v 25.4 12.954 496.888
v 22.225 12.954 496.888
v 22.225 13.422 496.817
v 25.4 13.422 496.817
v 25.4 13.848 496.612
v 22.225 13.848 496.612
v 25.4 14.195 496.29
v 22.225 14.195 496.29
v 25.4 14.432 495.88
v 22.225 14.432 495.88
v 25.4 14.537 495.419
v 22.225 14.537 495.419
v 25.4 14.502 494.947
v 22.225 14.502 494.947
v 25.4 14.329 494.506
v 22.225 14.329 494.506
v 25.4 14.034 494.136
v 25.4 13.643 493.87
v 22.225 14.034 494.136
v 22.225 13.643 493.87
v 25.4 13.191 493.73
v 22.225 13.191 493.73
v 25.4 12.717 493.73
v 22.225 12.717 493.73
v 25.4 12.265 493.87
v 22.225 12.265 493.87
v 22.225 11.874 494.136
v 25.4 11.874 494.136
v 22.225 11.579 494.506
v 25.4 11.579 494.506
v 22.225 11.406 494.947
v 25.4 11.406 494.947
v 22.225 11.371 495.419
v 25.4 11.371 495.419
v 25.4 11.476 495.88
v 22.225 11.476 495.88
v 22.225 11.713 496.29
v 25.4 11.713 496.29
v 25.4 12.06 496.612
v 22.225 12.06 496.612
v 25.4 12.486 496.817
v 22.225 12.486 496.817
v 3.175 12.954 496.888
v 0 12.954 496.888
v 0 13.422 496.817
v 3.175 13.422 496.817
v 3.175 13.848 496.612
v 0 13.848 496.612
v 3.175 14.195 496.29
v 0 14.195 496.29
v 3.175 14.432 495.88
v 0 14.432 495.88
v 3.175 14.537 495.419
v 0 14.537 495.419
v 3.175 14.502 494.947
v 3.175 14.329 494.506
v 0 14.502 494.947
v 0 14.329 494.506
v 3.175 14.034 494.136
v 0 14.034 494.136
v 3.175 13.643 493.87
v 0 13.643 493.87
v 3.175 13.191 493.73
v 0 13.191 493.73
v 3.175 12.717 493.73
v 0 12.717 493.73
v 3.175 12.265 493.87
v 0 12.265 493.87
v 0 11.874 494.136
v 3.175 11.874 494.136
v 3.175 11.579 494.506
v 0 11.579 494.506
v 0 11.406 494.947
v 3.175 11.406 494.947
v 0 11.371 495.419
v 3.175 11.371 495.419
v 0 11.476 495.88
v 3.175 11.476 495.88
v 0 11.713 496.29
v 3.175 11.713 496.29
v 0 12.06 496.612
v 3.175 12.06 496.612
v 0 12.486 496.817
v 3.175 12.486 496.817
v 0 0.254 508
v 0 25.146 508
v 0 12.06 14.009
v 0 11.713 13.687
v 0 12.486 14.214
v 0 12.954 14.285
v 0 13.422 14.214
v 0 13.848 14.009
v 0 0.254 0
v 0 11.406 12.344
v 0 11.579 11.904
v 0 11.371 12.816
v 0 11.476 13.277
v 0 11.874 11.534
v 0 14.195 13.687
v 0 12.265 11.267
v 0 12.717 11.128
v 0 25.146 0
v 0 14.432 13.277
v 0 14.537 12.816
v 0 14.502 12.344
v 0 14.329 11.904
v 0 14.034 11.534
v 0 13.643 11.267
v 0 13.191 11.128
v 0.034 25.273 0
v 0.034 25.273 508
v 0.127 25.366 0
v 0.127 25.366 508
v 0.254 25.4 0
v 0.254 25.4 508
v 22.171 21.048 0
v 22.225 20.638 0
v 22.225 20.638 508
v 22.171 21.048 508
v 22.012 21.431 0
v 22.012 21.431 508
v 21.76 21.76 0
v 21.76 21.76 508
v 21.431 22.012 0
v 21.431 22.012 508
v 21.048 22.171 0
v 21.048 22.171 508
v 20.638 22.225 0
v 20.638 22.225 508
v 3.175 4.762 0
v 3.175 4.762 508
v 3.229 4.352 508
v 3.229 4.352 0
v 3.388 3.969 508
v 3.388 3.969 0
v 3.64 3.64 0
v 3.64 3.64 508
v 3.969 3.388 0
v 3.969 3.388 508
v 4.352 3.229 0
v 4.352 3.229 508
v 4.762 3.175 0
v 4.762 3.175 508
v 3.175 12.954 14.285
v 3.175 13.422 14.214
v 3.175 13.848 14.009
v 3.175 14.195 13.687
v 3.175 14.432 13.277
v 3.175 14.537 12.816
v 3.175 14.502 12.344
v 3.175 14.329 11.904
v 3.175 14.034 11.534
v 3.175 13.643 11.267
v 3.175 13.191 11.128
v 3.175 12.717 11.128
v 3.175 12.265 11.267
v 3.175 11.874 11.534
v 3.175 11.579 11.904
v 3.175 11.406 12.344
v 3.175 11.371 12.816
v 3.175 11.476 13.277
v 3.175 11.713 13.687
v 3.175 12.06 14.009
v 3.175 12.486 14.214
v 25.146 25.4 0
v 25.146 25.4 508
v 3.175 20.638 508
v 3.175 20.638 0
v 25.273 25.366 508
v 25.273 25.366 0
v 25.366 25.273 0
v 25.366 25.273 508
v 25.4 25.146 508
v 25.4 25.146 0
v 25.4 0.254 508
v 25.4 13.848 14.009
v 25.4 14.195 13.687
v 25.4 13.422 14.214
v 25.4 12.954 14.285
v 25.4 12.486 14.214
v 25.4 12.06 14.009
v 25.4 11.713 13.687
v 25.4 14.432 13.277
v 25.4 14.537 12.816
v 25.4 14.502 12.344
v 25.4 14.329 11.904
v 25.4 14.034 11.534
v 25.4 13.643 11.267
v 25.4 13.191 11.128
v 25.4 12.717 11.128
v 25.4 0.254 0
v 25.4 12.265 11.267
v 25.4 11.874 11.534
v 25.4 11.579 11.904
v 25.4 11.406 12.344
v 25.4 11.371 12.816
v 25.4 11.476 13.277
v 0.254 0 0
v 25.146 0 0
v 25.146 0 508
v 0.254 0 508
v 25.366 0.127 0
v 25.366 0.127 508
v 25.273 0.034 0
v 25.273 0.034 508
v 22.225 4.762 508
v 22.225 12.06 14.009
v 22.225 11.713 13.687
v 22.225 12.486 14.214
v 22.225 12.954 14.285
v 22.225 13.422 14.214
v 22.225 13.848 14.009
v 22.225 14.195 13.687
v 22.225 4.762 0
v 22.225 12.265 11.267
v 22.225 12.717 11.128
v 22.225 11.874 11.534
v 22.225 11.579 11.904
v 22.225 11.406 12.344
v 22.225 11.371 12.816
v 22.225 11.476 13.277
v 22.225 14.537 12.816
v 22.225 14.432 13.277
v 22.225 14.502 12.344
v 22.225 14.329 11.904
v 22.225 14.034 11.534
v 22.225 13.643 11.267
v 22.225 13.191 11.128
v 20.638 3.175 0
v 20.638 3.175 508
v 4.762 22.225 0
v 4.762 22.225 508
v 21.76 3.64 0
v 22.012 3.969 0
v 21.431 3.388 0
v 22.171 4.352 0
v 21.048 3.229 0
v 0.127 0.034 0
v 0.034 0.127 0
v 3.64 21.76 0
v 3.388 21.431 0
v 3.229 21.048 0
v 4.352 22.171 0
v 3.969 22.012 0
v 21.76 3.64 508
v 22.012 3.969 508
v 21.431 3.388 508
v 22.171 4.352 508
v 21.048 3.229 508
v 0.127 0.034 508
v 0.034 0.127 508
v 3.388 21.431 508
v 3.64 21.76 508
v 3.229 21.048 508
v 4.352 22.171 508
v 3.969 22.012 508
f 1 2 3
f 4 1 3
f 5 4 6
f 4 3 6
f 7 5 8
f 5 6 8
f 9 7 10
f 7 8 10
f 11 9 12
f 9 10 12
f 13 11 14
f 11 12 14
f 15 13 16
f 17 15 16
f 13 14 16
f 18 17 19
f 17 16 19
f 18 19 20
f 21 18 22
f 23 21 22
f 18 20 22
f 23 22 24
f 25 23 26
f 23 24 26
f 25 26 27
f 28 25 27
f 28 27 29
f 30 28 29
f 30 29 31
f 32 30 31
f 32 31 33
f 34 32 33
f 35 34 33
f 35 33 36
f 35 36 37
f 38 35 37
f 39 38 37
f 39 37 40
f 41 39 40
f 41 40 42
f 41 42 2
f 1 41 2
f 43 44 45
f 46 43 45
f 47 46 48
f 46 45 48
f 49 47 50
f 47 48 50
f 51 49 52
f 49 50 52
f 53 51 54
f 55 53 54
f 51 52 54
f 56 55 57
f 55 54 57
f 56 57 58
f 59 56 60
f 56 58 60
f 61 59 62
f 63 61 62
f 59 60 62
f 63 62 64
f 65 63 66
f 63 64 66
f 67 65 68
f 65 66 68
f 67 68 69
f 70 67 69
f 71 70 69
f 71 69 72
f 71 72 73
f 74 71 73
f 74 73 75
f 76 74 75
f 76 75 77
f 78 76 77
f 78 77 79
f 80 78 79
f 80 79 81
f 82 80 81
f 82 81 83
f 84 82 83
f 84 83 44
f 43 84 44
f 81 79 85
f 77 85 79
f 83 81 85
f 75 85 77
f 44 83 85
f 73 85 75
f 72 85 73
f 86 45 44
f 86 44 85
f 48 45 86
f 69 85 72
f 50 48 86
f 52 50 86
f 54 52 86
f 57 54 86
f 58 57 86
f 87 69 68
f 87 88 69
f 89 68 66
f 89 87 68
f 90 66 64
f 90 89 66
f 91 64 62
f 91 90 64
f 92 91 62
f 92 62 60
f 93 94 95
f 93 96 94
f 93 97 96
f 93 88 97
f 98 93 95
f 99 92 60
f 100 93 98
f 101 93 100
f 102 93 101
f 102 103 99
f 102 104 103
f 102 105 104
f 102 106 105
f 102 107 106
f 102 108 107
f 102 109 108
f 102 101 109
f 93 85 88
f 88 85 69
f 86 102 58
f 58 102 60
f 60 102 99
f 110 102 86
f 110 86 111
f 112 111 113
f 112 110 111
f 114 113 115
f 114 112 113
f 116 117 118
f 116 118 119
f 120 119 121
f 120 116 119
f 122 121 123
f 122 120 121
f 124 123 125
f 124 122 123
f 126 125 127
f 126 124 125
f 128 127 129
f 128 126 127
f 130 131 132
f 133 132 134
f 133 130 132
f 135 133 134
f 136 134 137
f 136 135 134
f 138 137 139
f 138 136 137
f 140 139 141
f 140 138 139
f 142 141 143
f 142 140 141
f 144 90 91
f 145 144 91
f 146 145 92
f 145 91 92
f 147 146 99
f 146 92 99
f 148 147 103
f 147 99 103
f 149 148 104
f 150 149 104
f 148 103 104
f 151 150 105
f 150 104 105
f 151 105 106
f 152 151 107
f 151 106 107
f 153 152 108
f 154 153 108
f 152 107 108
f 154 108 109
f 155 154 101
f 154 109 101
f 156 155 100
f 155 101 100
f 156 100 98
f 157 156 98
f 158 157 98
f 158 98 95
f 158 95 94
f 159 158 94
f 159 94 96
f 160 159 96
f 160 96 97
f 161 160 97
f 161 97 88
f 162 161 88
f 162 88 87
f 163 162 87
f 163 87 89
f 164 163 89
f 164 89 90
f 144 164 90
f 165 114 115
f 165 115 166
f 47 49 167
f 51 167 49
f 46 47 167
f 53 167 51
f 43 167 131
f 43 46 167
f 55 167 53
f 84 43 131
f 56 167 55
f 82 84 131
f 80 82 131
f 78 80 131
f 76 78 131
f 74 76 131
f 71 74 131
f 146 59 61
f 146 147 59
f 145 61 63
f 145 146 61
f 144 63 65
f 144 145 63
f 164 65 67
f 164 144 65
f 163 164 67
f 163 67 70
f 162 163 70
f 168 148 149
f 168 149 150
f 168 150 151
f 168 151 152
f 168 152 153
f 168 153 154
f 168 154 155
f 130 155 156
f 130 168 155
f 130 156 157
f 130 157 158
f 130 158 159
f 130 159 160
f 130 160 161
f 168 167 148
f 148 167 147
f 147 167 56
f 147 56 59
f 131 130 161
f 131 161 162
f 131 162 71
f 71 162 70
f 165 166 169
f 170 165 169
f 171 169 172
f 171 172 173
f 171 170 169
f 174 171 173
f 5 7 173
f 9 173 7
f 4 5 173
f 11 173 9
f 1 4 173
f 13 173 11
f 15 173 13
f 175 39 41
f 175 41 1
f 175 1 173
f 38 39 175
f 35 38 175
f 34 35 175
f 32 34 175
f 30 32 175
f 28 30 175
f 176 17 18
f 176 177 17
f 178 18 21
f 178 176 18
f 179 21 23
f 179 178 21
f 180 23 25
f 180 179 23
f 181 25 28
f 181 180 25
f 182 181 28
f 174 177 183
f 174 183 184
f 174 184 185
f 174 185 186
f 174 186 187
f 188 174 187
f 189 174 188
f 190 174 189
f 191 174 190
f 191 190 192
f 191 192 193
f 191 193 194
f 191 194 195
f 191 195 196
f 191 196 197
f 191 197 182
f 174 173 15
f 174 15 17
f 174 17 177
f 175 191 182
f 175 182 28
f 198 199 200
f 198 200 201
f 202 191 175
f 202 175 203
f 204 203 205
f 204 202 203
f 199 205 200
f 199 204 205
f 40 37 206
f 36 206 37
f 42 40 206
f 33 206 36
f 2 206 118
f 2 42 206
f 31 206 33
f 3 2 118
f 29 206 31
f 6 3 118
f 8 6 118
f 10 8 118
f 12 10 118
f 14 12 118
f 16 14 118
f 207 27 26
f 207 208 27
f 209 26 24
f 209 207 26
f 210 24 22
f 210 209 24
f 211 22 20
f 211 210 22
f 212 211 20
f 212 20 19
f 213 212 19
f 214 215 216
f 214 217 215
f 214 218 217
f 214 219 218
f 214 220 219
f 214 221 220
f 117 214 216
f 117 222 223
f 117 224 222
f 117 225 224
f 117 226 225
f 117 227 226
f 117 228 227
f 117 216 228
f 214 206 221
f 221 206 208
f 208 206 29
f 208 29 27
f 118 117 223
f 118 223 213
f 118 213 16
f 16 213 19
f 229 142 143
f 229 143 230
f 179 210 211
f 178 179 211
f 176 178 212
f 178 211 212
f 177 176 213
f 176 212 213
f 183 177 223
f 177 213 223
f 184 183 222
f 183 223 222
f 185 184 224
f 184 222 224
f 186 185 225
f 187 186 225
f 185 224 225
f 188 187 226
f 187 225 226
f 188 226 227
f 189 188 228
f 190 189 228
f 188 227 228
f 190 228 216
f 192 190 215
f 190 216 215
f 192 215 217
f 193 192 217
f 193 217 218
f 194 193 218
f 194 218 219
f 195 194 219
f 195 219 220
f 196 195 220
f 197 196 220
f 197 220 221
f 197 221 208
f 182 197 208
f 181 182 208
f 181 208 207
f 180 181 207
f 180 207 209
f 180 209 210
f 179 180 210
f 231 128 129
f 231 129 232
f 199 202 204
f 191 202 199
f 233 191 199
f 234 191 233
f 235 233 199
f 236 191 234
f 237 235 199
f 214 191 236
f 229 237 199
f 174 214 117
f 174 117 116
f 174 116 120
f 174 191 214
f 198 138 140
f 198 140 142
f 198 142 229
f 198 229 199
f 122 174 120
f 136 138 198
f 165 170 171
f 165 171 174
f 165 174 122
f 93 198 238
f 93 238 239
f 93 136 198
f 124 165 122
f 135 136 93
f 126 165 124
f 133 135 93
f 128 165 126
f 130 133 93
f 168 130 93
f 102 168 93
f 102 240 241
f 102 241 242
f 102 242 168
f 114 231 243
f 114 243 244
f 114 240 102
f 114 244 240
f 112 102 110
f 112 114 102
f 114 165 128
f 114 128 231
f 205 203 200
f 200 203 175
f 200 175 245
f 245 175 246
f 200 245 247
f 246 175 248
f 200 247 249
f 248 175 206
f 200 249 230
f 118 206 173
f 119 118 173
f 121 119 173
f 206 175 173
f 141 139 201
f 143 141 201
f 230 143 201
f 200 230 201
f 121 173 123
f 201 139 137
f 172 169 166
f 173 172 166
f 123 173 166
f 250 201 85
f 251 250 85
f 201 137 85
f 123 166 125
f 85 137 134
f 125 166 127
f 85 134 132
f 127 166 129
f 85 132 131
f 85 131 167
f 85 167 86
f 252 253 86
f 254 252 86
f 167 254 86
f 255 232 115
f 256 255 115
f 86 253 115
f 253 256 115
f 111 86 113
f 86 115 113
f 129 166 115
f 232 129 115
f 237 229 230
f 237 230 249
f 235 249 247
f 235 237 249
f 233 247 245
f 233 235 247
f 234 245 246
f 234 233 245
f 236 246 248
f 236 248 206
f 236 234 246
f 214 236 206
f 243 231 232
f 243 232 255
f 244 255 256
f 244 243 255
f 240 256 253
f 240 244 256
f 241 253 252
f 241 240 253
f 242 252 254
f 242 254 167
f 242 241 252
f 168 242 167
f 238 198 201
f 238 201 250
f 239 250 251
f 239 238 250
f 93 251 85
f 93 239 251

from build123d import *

# Parameters (mm, degrees)
BOSS_EXTRUDE1_DEPTH = 508
SKETCH2_R           = 1.5875
CUT_EXTRUDE1_DEPTH  = 26.4


with BuildPart() as part:
    # Sketch1 → Boss-Extrude1 (new body)
    with BuildSketch(Plane(origin=(0, 0, 0), x_dir=(-1, 0, 0), z_dir=(0, 0, -1))):
        with BuildLine():
            Line((0, 0.254), (0, 25.146))
            ThreePointArc((0, 25.146), (-0.074394878, 25.325605122), (-0.254, 25.4))
            Line((-0.254, 25.4), (-25.146, 25.4))
            ThreePointArc((-25.146, 25.4), (-25.325605122, 25.325605122), (-25.4, 25.146))
            Line((-25.4, 25.146), (-25.4, 0.254))
            ThreePointArc((-25.4, 0.254), (-25.325605122, 0.074394878), (-25.146, 0))
            Line((-25.146, 0), (-0.254, 0))
            ThreePointArc((-0.254, 0), (-0.074394878, 0.074394878), (0, 0.254))
        make_face()
        with BuildLine():
            Line((-3.175, 20.6375), (-3.175, 4.7625))
            ThreePointArc((-3.175, 4.7625), (-3.639967985, 3.639967985), (-4.7625, 3.175))
            Line((-4.7625, 3.175), (-20.6375, 3.175))
            ThreePointArc((-20.6375, 3.175), (-21.760032015, 3.639967985), (-22.225, 4.7625))
            Line((-22.225, 4.7625), (-22.225, 20.6375))
            ThreePointArc((-22.225, 20.6375), (-21.760032015, 21.760032015), (-20.6375, 22.225))
            Line((-20.6375, 22.225), (-4.7625, 22.225))
            ThreePointArc((-4.7625, 22.225), (-3.639967985, 21.760032015), (-3.175, 20.6375))
        make_face(mode=Mode.SUBTRACT)
    extrude(amount=-BOSS_EXTRUDE1_DEPTH)

    # Sketch2 → Cut-Extrude1 (cut, through all)
    with BuildSketch(Plane.ZY):
        with Locations((12.697459746, 12.954)):
            Circle(SKETCH2_R)
        with Locations((495.3, 12.954)):
            Circle(SKETCH2_R)
    extrude(amount=-CUT_EXTRUDE1_DEPTH, mode=Mode.SUBTRACT)


solid = part.part
